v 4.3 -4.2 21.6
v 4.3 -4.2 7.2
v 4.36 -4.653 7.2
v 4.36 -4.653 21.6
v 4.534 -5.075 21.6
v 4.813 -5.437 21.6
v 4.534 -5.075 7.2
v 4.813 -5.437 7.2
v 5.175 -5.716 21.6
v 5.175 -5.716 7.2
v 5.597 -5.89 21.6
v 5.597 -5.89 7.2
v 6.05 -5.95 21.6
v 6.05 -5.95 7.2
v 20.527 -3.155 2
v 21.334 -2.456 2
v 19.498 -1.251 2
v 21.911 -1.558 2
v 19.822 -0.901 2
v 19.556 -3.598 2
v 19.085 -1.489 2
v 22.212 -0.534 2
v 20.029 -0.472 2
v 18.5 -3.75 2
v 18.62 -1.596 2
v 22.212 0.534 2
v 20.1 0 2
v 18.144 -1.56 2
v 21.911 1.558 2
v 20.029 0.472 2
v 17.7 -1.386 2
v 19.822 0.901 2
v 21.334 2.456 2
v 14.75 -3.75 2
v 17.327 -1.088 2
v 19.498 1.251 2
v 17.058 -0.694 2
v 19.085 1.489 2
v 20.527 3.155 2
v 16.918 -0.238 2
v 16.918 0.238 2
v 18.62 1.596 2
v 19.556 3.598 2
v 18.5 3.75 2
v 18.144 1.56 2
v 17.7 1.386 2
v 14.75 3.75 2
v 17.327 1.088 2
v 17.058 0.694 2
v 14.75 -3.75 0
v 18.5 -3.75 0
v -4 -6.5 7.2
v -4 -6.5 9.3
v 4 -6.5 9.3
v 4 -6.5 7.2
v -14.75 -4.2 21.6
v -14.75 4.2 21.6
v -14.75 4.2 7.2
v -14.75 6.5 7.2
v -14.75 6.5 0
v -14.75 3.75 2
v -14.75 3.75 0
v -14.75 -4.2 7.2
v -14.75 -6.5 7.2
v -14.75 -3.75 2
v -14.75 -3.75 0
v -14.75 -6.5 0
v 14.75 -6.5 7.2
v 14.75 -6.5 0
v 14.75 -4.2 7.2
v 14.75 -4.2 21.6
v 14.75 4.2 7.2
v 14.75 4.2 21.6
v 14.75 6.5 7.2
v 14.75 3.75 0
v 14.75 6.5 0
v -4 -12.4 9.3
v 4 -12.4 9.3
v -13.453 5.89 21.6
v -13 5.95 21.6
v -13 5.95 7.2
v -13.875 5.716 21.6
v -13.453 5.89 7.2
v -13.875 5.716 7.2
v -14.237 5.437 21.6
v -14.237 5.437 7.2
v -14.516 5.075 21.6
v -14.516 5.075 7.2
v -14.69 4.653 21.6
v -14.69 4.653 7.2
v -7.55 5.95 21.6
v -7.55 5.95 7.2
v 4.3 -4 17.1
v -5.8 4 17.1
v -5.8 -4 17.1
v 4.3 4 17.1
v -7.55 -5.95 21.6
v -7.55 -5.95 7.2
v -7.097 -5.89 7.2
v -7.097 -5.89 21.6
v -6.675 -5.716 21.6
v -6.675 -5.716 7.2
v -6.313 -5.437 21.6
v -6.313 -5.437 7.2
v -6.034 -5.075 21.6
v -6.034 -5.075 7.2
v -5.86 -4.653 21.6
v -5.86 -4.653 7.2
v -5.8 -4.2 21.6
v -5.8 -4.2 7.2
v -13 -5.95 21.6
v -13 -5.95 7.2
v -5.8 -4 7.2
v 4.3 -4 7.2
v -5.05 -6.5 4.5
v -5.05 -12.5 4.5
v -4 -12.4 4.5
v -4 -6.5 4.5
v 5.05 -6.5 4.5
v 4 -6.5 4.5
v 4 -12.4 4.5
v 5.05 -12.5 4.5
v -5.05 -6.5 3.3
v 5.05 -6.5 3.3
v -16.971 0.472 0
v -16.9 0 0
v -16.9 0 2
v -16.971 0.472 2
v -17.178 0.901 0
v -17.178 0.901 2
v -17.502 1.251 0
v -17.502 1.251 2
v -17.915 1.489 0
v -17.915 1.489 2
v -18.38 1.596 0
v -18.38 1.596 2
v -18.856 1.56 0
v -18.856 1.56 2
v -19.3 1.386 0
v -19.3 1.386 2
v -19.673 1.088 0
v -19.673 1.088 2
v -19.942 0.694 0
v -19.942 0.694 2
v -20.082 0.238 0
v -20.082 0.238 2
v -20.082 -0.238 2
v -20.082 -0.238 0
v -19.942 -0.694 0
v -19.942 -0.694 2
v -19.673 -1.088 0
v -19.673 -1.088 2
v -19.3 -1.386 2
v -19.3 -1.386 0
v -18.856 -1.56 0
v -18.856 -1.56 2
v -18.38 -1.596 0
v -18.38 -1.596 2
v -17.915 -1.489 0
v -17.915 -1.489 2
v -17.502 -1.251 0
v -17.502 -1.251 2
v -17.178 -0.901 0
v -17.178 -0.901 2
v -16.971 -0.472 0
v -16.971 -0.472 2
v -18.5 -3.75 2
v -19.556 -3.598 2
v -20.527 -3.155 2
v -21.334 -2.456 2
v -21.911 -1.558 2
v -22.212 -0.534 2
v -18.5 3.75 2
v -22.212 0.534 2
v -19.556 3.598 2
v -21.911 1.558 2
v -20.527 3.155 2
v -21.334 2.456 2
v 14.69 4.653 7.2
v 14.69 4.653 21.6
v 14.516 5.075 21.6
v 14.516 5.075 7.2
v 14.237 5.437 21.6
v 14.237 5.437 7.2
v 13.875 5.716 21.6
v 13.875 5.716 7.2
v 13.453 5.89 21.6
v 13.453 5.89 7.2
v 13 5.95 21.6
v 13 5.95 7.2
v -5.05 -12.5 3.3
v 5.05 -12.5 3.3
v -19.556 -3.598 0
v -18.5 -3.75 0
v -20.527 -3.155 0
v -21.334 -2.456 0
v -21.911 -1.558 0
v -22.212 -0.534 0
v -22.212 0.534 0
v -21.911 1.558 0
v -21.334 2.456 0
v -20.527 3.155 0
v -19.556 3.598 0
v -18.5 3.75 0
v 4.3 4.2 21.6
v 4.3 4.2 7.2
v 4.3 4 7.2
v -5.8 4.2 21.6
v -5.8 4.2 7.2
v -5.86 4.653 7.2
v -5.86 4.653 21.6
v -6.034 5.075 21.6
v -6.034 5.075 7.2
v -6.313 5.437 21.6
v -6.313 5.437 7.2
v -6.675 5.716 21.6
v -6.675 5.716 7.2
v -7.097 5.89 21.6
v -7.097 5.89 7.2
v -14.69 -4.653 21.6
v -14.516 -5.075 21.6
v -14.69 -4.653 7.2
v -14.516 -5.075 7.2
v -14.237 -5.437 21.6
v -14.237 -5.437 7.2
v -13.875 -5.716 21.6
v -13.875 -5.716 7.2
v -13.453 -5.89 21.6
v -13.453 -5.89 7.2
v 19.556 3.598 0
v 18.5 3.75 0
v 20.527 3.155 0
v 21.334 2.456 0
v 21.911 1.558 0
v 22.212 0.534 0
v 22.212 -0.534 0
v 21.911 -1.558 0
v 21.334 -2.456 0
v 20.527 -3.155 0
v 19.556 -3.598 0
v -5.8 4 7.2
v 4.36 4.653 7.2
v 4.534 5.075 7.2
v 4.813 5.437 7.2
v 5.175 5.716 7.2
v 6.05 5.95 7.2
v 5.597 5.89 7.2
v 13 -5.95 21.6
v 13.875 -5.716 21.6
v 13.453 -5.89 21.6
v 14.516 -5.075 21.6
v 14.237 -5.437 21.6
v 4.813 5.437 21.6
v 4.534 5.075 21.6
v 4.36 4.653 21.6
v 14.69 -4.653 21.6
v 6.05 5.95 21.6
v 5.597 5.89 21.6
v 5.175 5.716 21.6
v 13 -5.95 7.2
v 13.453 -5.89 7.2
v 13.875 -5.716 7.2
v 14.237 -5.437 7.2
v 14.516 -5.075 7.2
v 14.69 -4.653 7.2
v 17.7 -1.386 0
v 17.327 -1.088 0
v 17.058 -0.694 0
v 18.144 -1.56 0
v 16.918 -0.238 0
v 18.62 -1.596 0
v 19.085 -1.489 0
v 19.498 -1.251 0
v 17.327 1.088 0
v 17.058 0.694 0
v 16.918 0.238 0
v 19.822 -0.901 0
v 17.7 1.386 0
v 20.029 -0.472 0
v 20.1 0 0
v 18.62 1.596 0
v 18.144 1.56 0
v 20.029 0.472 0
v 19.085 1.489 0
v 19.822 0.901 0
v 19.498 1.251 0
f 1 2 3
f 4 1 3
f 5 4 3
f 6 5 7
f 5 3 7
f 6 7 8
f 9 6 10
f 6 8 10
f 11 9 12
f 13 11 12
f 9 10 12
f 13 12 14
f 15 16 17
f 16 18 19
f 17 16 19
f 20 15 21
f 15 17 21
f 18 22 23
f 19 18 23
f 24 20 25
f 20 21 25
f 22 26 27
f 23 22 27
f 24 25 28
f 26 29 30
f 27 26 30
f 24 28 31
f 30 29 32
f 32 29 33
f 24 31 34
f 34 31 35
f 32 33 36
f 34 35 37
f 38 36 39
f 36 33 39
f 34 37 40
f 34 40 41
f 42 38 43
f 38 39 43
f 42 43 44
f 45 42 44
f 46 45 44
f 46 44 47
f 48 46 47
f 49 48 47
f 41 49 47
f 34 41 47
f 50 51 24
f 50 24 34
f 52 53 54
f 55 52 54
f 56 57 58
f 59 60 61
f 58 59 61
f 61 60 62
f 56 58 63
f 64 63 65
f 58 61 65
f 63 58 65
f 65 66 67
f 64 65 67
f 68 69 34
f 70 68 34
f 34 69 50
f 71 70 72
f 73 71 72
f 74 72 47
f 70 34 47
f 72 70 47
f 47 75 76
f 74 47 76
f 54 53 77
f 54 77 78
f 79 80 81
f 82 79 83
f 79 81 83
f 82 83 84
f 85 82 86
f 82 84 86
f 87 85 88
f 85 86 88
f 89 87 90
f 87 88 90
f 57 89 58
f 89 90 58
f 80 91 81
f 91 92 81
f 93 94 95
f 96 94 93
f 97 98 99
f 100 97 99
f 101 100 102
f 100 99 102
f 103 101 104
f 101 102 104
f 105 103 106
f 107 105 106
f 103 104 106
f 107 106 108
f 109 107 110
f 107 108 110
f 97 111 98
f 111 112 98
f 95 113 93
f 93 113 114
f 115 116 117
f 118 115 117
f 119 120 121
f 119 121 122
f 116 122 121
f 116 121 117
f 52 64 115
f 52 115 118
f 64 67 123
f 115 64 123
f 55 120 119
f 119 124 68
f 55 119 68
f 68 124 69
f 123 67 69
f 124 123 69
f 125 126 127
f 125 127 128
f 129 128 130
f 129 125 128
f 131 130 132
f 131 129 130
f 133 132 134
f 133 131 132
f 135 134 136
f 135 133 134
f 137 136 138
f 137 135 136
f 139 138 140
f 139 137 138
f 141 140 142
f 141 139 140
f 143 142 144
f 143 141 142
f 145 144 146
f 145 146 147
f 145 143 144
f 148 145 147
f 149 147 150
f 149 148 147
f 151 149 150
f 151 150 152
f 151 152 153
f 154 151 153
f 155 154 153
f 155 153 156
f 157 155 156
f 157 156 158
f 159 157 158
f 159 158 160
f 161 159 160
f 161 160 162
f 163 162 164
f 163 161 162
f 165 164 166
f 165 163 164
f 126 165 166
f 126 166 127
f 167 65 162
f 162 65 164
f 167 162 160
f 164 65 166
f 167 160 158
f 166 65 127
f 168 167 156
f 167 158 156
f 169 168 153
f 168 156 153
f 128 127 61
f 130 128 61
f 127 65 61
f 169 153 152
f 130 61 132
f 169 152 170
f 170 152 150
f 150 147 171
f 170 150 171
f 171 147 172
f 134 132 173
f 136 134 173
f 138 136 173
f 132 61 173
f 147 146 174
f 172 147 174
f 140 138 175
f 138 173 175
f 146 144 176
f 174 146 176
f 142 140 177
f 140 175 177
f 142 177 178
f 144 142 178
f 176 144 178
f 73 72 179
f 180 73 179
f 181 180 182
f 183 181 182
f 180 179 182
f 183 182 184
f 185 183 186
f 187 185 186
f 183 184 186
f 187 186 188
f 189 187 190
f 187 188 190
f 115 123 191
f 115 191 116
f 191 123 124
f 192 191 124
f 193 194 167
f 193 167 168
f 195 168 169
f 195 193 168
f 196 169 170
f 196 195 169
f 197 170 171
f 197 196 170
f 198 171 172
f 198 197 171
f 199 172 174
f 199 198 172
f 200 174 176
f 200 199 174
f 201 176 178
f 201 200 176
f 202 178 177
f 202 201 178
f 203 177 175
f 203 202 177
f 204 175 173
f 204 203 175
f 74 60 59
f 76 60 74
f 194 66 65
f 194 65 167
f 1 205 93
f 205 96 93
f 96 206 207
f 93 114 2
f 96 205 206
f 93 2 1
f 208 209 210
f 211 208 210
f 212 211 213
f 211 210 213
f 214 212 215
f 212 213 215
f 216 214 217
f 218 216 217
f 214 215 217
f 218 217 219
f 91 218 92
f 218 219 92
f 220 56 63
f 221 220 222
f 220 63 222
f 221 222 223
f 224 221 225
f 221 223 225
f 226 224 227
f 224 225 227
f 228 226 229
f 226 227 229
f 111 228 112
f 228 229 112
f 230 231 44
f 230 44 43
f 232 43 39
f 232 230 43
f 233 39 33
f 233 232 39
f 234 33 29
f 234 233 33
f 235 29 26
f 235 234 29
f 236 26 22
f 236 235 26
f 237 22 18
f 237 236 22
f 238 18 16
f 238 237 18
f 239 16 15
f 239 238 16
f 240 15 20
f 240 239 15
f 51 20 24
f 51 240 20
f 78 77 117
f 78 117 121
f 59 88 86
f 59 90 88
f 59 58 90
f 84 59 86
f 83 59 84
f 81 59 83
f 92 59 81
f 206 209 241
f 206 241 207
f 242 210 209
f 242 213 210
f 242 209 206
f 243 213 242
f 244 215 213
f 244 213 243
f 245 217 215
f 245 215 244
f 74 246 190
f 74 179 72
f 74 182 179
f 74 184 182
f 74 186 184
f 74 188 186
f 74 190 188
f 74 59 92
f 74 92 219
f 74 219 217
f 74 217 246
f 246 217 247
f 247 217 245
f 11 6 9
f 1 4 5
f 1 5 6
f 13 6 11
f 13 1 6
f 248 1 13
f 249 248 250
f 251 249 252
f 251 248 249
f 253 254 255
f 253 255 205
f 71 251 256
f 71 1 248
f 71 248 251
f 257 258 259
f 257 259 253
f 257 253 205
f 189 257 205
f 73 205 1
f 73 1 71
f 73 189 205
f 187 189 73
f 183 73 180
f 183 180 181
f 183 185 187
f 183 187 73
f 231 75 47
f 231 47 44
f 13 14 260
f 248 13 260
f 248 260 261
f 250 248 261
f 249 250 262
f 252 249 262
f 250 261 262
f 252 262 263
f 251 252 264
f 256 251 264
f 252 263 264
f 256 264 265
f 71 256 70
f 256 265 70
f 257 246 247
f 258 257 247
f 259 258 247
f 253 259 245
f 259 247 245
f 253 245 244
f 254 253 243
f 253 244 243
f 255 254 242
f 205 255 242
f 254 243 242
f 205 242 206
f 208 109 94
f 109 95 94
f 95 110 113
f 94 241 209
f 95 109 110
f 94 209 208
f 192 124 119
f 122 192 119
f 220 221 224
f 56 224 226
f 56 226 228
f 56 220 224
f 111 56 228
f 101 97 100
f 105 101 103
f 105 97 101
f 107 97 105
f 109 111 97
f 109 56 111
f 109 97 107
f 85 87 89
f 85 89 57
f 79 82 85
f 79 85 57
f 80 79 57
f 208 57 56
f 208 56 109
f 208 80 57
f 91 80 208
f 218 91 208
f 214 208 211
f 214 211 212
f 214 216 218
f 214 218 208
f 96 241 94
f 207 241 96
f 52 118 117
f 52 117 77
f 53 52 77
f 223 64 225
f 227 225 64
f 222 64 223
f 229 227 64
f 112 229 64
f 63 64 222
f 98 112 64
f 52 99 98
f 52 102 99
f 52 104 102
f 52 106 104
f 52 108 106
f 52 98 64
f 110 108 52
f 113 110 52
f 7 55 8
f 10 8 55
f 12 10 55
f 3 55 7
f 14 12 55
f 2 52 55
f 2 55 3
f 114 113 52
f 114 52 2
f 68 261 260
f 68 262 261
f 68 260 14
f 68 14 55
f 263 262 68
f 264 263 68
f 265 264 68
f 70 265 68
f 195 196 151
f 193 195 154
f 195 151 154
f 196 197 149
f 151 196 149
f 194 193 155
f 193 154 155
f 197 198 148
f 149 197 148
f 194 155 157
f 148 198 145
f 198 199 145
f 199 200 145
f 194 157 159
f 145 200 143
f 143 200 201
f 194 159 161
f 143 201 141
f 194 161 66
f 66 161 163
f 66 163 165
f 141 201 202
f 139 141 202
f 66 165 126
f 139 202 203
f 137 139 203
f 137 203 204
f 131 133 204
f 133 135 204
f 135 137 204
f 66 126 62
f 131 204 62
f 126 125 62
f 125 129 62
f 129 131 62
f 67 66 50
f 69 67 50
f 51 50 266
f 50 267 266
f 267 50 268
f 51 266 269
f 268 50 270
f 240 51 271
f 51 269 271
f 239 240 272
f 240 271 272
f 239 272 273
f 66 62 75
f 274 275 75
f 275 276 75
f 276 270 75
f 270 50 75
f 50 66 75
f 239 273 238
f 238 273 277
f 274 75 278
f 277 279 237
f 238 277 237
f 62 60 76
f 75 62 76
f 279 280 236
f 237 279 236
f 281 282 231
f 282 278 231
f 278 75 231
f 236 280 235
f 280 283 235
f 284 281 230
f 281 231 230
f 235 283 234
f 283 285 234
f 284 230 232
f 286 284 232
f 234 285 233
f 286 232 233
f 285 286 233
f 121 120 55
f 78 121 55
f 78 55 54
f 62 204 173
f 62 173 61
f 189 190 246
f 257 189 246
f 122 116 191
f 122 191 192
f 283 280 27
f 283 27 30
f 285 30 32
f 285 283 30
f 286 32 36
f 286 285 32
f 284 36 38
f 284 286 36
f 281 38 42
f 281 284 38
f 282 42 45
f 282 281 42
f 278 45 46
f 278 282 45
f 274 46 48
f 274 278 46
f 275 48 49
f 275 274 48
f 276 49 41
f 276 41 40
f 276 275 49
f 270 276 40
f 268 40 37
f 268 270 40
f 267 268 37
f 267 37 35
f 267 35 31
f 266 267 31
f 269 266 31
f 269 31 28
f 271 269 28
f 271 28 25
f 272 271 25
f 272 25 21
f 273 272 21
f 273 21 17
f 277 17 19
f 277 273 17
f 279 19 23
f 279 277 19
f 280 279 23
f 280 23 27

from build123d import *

# Parameters (mm, degrees)
CROQUIS1_R              = 1.6
SALIENTE_EXTRUIR1_DEPTH = 2
CROQUIS2_W              = 29.5
CROQUIS2_H              = 13
SALIENTE_EXTRUIR2_DEPTH = 7.2
CROQUIS3_W              = 10.1
CROQUIS3_H              = 8
SALIENTE_EXTRUIR3_DEPTH = 9.9
SALIENTE_EXTRUIR4_DEPTH = 4.5
CROQUIS5_W              = 10.1
CROQUIS5_H              = 1.2
SALIENTE_EXTRUIR5_DEPTH = 6
CROQUIS6_W              = 8
CROQUIS6_H              = 4.8
SALIENTE_EXTRUIR6_DEPTH = 5.9


with BuildPart() as part:
    # Croquis1 → Saliente-Extruir1 (new body)
    with BuildSketch(Plane.XY):
        with BuildLine():
            Line((18.5, -3.75), (-18.5, -3.75))
            ThreePointArc((-18.5, -3.75), (-22.25, 0), (-18.5, 3.75))
            Line((-18.5, 3.75), (18.5, 3.75))
            ThreePointArc((18.5, 3.75), (22.25, 0), (18.5, -3.75))
        make_face()
        with Locations((-18.5, 0)):
            Circle(CROQUIS1_R, mode=Mode.SUBTRACT)
        with Locations((18.5, 0)):
            Circle(CROQUIS1_R, mode=Mode.SUBTRACT)
    extrude(amount=SALIENTE_EXTRUIR1_DEPTH)

    # Croquis2 → Saliente-Extruir2 (add)
    with BuildSketch(Plane.XY):
        Rectangle(CROQUIS2_W, CROQUIS2_H)
    extrude(amount=SALIENTE_EXTRUIR2_DEPTH)

    # Croquis3 → Saliente-Extruir3 (add)
    with BuildSketch(Plane.XY.offset(7.2)):
        with BuildLine():
            ThreePointArc((-5.8, 4.2), (-6.312563133, 5.437436867), (-7.55, 5.95))
            Line((-7.55, 5.95), (-13, 5.95))
            ThreePointArc((-13, 5.95), (-14.237436867, 5.437436867), (-14.75, 4.2))
            Line((-14.75, 4.2), (-14.75, -4.2))
            ThreePointArc((-14.75, -4.2), (-14.237436867, -5.437436867), (-13, -5.95))
            Line((-13, -5.95), (-7.55, -5.95))
            ThreePointArc((-7.55, -5.95), (-6.312563133, -5.437436867), (-5.8, -4.2))
            Line((-5.8, -4.2), (-5.8, -4))
            Line((-5.8, -4), (-5.8, 4))
            Line((-5.8, 4), (-5.8, 4.2))
        make_face()
        with Locations((-0.75, 0)):
            Rectangle(CROQUIS3_W, CROQUIS3_H)
        with BuildLine():
            Line((4.3, 4.2), (4.3, 4))
            Line((4.3, 4), (4.3, -4))
            Line((4.3, -4), (4.3, -4.2))
            ThreePointArc((4.3, -4.2), (4.812563133, -5.437436867), (6.05, -5.95))
            Line((6.05, -5.95), (13, -5.95))
            ThreePointArc((13, -5.95), (14.237436867, -5.437436867), (14.75, -4.2))
            Line((14.75, -4.2), (14.75, 4.2))
            ThreePointArc((14.75, 4.2), (14.237436867, 5.437436867), (13, 5.95))
            Line((13, 5.95), (6.05, 5.95))
            ThreePointArc((6.05, 5.95), (4.812563133, 5.437436867), (4.3, 4.2))
        make_face()
    extrude(amount=SALIENTE_EXTRUIR3_DEPTH)

    # Croquis4 → Saliente-Extruir4 (add)
    with BuildSketch(Plane.XY.offset(17.1)):
        with BuildLine():
            Line((-5.8, -4), (-5.8, 4))
            Line((-5.8, 4), (-5.8, 4.2))
            ThreePointArc((-5.8, 4.2), (-6.312563133, 5.437436867), (-7.55, 5.95))
            Line((-7.55, 5.95), (-13, 5.95))
            ThreePointArc((-13, 5.95), (-14.237436867, 5.437436867), (-14.75, 4.2))
            Line((-14.75, 4.2), (-14.75, -4.2))
            ThreePointArc((-14.75, -4.2), (-14.237436867, -5.437436867), (-13, -5.95))
            Line((-13, -5.95), (-7.55, -5.95))
            ThreePointArc((-7.55, -5.95), (-6.312563133, -5.437436867), (-5.8, -4.2))
            Line((-5.8, -4.2), (-5.8, -4))
        make_face()
        with BuildLine():
            Line((4.3, 4), (4.3, -4))
            Line((4.3, -4), (4.3, -4.2))
            ThreePointArc((4.3, -4.2), (4.812563133, -5.437436867), (6.05, -5.95))
            Line((6.05, -5.95), (13, -5.95))
            ThreePointArc((13, -5.95), (14.237436867, -5.437436867), (14.75, -4.2))
            Line((14.75, -4.2), (14.75, 4.2))
            ThreePointArc((14.75, 4.2), (14.237436867, 5.437436867), (13, 5.95))
            Line((13, 5.95), (6.05, 5.95))
            ThreePointArc((6.05, 5.95), (4.812563133, 5.437436867), (4.3, 4.2))
            Line((4.3, 4.2), (4.3, 4))
        make_face()
    extrude(amount=SALIENTE_EXTRUIR4_DEPTH)

    # Croquis5 → Saliente-Extruir5 (add)
    with BuildSketch(Plane.XZ.offset(6.5)):
        with Locations((0, 3.9)):
            Rectangle(CROQUIS5_W, CROQUIS5_H)
    extrude(amount=SALIENTE_EXTRUIR5_DEPTH)

    # Croquis6 → Saliente-Extruir6 (add)
    with BuildSketch(Plane.XZ.offset(6.5)):
        with Locations((0, 6.9)):
            Rectangle(CROQUIS6_W, CROQUIS6_H)
    extrude(amount=SALIENTE_EXTRUIR6_DEPTH)


solid = part.part
